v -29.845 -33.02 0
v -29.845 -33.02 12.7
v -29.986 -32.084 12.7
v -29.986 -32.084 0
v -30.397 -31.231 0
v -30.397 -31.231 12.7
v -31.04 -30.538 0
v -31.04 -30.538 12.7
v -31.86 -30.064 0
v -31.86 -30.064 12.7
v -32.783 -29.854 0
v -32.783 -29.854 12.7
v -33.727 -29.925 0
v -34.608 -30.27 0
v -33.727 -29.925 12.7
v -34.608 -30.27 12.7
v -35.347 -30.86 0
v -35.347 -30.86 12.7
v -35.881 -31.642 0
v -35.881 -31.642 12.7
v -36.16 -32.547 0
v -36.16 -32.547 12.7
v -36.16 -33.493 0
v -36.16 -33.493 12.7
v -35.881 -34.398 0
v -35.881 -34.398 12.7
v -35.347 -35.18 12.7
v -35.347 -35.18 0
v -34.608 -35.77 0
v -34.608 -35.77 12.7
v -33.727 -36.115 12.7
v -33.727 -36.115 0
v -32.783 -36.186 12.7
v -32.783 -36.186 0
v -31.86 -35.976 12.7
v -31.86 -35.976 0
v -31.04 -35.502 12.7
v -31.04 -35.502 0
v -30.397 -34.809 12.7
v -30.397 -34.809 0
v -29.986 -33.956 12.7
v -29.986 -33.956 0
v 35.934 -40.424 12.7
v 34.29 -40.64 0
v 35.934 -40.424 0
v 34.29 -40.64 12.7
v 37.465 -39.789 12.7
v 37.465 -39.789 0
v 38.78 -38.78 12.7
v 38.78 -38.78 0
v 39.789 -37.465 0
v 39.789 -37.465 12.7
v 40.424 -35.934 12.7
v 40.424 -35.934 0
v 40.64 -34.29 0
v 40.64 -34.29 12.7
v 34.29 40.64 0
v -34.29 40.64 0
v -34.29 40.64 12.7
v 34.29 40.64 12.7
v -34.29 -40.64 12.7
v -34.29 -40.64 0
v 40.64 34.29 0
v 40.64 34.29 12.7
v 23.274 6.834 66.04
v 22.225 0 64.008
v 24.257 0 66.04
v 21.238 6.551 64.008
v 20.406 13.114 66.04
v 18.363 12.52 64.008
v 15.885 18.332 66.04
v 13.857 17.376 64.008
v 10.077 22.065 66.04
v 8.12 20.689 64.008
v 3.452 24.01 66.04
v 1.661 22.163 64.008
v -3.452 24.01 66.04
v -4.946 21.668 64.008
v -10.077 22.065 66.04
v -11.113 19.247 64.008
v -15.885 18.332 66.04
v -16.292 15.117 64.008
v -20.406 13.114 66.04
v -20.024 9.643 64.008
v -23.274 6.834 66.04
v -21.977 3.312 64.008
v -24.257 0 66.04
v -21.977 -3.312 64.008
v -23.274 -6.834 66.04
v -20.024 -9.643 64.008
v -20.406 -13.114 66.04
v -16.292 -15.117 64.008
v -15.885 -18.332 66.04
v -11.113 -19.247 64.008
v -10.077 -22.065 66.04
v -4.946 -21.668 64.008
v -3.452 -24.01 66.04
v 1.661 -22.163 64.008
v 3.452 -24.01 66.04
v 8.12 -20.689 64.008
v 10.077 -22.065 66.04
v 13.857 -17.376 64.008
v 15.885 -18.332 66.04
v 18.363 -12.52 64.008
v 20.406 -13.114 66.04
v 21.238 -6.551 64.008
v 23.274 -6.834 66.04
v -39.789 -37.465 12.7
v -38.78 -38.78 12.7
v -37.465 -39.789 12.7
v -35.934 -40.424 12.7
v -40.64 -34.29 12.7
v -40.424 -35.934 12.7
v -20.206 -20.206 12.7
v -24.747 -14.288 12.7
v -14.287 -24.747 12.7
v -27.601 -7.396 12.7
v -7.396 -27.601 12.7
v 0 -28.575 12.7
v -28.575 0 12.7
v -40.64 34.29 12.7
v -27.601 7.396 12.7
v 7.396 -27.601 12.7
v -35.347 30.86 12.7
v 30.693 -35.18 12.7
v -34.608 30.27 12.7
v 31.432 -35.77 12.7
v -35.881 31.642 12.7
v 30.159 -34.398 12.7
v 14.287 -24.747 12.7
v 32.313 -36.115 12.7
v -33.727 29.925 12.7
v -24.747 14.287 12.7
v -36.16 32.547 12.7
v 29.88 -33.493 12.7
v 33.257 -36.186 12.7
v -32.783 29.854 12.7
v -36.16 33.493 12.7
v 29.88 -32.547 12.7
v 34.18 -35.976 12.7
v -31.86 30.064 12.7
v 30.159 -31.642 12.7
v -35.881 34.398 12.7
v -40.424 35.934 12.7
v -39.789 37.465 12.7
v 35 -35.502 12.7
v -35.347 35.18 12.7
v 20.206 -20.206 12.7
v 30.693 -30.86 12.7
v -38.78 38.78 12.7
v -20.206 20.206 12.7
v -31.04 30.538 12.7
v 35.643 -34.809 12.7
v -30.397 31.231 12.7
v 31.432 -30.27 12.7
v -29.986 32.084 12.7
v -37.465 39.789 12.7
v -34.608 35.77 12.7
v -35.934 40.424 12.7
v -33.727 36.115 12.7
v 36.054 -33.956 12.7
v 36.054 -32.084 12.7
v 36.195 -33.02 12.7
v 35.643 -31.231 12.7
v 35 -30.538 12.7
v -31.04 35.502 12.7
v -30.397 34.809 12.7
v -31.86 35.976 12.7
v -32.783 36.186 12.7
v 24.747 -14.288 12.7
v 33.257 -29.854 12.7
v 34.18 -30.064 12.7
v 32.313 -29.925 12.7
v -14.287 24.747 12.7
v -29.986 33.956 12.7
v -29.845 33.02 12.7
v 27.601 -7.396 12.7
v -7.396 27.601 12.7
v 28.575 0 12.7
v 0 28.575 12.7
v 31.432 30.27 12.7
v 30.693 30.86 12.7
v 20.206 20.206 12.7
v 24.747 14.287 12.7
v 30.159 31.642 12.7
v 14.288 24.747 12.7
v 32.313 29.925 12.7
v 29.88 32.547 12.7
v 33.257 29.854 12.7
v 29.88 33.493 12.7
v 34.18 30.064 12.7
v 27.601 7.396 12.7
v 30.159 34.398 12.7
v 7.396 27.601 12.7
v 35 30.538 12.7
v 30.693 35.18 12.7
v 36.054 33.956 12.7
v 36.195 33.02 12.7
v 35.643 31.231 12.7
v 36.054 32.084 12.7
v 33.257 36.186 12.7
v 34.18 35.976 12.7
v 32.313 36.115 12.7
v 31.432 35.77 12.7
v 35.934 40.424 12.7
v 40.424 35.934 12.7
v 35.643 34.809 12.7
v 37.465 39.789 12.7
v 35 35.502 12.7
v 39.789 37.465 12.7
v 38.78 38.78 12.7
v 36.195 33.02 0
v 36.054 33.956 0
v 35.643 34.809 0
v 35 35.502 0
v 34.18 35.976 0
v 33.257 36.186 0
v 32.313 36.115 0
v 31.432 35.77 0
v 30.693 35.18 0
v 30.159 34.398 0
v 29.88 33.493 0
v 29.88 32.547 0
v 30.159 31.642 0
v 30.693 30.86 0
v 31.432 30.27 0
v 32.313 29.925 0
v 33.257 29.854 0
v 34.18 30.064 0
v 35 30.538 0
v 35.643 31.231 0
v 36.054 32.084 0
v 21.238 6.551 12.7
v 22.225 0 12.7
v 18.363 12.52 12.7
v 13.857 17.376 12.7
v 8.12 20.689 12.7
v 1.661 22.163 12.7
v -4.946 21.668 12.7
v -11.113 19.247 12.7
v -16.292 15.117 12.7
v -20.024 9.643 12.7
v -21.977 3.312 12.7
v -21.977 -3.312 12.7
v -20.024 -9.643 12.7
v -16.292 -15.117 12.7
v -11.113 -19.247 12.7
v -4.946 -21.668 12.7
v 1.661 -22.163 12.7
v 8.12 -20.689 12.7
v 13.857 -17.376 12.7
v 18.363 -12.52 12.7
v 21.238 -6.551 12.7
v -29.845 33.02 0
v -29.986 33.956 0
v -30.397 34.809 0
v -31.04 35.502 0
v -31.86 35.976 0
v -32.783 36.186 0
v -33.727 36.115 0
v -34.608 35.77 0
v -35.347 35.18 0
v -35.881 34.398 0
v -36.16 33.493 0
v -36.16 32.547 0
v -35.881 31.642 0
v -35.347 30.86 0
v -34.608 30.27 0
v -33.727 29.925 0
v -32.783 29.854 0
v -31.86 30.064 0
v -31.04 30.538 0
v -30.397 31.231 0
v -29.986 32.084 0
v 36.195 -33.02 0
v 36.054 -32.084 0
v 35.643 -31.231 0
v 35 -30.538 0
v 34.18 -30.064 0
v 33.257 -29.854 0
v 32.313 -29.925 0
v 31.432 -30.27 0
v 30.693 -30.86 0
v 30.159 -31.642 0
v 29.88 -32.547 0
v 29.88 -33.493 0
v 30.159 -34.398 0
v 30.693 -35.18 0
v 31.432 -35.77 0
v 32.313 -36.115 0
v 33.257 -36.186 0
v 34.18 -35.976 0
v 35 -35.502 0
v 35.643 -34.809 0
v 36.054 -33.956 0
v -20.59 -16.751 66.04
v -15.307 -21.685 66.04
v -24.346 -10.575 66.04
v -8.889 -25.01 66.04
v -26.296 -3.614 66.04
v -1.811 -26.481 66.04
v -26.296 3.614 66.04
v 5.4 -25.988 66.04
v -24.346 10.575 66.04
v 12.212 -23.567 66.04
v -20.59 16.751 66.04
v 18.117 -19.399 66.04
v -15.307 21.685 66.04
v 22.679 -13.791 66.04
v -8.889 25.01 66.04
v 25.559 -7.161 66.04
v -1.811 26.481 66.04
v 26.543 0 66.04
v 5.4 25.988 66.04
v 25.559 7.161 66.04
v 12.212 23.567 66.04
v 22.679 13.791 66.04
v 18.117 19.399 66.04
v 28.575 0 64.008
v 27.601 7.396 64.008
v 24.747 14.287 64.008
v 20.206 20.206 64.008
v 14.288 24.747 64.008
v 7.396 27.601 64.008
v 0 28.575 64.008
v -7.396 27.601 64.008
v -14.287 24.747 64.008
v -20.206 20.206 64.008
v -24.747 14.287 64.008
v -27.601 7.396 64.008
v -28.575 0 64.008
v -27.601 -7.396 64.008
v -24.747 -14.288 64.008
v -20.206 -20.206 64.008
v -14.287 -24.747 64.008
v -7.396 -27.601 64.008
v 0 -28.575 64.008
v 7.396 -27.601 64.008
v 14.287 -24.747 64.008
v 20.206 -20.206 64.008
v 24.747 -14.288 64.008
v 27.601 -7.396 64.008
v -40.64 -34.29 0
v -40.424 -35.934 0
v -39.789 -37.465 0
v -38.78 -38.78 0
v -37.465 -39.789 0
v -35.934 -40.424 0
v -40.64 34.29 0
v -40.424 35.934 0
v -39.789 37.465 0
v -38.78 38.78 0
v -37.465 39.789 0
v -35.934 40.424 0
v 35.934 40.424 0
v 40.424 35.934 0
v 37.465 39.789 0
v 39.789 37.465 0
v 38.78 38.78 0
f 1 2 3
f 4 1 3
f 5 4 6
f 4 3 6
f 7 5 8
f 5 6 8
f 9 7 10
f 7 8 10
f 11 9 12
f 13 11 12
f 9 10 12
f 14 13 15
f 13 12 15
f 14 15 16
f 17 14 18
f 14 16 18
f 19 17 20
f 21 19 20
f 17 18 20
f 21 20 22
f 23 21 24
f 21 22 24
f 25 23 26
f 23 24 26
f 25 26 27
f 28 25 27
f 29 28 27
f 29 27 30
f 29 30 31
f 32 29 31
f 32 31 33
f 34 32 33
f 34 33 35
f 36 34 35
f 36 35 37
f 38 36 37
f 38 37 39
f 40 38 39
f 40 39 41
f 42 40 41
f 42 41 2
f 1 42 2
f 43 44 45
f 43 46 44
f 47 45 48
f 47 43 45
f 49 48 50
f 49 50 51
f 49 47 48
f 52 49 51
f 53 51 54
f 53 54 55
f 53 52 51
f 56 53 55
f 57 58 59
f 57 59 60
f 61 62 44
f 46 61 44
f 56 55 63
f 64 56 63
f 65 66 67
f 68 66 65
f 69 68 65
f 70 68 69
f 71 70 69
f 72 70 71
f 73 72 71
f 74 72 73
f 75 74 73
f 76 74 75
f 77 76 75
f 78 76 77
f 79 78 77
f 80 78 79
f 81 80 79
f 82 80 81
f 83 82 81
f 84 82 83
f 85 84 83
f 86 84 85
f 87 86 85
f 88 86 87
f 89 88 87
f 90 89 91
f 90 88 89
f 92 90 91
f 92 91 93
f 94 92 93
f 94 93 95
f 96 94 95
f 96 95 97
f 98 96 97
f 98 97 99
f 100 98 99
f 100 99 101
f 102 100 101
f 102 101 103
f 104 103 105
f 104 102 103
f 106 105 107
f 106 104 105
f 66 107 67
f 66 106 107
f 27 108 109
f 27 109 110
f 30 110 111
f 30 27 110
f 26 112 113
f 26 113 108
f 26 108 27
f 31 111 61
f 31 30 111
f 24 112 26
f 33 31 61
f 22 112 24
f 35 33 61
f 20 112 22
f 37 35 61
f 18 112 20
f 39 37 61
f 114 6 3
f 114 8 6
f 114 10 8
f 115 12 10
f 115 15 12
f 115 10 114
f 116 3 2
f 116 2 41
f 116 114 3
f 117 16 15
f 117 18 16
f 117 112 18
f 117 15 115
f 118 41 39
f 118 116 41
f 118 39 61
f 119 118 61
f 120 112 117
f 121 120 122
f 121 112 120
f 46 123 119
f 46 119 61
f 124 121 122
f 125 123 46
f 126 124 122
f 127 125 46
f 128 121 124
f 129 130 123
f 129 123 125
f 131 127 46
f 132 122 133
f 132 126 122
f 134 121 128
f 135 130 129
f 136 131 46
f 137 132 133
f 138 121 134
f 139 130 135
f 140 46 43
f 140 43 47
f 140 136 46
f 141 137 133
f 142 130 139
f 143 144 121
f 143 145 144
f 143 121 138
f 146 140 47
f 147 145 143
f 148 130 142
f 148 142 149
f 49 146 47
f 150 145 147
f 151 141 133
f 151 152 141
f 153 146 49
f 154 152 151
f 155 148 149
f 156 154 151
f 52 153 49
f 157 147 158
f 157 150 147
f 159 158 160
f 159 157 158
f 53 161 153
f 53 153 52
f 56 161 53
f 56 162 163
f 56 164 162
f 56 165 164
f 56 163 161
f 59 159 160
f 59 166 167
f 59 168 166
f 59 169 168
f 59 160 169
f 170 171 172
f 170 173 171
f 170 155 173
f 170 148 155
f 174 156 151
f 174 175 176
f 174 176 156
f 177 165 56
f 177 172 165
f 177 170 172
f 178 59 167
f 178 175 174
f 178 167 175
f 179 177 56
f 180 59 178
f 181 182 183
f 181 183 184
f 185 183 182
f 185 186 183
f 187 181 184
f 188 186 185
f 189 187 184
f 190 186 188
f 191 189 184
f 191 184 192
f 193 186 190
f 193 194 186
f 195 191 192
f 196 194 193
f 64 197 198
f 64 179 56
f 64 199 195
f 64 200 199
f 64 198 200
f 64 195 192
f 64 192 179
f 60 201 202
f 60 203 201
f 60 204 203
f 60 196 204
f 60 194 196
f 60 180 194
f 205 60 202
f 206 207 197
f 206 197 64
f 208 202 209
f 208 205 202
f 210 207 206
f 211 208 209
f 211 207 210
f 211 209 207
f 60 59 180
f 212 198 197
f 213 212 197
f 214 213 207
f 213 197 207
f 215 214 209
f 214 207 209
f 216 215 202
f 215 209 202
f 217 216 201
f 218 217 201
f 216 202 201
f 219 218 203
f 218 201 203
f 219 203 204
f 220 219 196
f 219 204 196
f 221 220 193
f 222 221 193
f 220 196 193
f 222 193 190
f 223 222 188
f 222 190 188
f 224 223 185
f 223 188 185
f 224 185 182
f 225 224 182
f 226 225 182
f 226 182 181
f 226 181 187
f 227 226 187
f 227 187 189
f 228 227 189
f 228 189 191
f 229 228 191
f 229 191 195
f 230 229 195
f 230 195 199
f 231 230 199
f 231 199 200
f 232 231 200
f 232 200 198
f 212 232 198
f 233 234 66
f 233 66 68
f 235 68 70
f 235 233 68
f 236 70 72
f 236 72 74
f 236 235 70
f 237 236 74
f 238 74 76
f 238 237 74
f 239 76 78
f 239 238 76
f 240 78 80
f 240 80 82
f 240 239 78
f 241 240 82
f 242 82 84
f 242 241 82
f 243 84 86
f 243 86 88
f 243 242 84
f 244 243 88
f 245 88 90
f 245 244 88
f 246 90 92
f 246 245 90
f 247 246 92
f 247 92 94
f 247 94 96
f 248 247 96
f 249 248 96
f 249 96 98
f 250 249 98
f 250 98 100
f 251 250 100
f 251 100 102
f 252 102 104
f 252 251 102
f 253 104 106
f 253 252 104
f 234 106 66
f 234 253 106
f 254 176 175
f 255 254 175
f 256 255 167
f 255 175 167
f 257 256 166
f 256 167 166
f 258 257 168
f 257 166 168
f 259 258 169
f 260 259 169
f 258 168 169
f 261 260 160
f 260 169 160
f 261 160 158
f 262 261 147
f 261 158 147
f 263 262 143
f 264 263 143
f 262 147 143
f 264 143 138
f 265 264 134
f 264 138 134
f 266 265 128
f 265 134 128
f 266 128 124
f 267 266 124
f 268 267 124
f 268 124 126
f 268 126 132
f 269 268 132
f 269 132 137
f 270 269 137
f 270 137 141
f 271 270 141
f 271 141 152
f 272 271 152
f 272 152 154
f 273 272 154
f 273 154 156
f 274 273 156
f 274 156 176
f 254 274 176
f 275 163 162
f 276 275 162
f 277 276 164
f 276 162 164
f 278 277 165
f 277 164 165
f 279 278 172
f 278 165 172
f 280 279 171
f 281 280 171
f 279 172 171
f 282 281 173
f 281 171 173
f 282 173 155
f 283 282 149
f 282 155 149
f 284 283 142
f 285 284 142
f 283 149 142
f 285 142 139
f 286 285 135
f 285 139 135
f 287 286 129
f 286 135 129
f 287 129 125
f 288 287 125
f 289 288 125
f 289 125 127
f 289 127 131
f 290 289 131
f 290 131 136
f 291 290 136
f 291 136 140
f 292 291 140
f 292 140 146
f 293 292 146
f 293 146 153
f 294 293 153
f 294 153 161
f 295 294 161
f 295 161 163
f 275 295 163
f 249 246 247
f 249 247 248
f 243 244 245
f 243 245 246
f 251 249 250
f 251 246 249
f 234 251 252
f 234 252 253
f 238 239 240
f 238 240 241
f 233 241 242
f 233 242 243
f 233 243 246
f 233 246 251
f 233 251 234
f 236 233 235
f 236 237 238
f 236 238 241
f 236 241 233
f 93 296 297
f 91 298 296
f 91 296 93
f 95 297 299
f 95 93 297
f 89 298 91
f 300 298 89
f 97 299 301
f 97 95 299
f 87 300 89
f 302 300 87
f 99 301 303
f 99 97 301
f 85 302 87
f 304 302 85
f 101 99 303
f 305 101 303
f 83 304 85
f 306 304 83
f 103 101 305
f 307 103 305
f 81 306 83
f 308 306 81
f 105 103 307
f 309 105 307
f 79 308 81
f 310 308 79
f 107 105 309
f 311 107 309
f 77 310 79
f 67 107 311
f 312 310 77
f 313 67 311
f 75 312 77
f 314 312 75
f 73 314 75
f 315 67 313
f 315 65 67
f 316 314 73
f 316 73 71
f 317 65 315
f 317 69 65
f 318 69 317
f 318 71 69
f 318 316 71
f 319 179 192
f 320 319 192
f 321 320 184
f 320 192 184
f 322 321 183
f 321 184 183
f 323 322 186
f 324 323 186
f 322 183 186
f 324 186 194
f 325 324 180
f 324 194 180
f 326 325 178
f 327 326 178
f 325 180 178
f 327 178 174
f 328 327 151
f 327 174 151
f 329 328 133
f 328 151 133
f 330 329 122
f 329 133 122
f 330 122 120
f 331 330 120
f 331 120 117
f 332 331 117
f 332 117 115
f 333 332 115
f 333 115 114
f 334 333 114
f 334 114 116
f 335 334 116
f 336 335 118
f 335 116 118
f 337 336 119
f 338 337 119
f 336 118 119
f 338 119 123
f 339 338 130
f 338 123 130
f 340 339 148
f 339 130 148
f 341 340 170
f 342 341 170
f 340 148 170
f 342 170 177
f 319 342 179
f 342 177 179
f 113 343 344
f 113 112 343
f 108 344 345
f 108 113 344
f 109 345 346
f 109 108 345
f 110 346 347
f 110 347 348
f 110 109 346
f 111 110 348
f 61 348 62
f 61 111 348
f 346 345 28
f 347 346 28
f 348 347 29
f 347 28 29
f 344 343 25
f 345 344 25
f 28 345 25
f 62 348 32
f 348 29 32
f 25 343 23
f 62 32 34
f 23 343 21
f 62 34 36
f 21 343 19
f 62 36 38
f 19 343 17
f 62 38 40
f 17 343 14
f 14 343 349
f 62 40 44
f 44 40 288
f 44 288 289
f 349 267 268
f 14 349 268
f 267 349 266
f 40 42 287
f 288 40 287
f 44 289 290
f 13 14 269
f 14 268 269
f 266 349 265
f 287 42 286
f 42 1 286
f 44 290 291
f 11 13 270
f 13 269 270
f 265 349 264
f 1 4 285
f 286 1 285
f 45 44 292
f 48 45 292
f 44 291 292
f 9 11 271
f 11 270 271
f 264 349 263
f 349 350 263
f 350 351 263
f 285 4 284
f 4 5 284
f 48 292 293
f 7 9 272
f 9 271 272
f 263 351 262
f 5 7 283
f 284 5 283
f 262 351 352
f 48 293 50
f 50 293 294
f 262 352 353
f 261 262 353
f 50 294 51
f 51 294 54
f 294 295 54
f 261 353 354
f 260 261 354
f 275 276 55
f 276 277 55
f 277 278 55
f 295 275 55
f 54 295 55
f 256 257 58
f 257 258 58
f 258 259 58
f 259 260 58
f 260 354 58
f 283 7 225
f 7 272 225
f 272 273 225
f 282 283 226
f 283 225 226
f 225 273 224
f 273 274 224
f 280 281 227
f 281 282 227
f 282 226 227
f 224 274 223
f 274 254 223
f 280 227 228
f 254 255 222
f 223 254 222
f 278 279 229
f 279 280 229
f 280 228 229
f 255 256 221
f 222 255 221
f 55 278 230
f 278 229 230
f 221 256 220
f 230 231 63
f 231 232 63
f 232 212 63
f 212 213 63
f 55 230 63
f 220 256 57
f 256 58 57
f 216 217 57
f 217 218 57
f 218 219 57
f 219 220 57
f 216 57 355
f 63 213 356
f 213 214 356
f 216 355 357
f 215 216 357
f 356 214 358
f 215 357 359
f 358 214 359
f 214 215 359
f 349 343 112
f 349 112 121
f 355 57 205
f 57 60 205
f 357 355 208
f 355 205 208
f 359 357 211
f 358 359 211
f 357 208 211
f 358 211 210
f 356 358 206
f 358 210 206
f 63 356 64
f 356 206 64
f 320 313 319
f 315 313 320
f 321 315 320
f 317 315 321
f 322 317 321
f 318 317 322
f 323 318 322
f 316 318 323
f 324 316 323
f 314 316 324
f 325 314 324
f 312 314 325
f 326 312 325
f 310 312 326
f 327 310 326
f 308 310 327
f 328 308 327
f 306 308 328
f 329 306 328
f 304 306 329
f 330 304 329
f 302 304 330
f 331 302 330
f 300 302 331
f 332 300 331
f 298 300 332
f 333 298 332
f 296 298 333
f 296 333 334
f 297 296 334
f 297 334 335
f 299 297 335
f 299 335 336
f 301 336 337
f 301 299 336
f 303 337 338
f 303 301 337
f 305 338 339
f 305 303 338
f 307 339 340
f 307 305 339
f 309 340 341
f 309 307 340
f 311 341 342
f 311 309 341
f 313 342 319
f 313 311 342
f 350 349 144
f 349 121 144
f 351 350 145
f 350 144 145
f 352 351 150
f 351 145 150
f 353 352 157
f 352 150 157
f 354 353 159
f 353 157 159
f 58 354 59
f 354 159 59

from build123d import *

# Parameters (mm, degrees)
F0_W     = 81.28
F0_H     = 81.28
F1_DEPTH = 12.7
F2_R     = 28.575
F2_R_2   = 22.225
F3_DEPTH = 53.34
F4_R     = 3.175
F5_DEPTH = 12.701
F6_R     = 6.35
F7_SIZE  = 2.032


with BuildPart() as f1:
    # F0 (on Top) → F1 (new body)
    with BuildSketch(Plane.XY):
        Rectangle(F0_W, F0_H)
    extrude(amount=F1_DEPTH)

    # F2 (on face) → F3 (join)
    with BuildSketch(Plane.XY.offset(12.7)):
        Circle(F2_R)
        Circle(F2_R_2, mode=Mode.SUBTRACT)
    extrude(amount=F3_DEPTH)

    # F4 (on face) → F5 (cut, through all)
    with BuildSketch(Plane.XY.offset(12.7)):
        with Locations((33.02, 33.02)):
            Circle(F4_R)
        with Locations((33.02, -33.02)):
            Circle(F4_R)
        with Locations((-33.02, -33.02)):
            Circle(F4_R)
        with Locations((-33.02, 33.02)):
            Circle(F4_R)
    extrude(amount=-F5_DEPTH, mode=Mode.SUBTRACT)

    # F6
    f6_edges = [f1.edges().sort_by_distance(p)[0] for p in [
        (-40.64, -40.64, 6.35),
        (-40.64, 40.64, 6.35),
        (40.64, 40.64, 6.35),
        (40.64, -40.64, 6.35),
    ]]
    fillet(f6_edges, radius=F6_R)

    # F7
    f7_edges = [f1.edges().sort_by_distance(p)[0] for p in [
        (-22.225, 0, 66.04),
        (-28.575, 0, 66.04),
    ]]
    chamfer(f7_edges, length=F7_SIZE)


solid = f1.part
